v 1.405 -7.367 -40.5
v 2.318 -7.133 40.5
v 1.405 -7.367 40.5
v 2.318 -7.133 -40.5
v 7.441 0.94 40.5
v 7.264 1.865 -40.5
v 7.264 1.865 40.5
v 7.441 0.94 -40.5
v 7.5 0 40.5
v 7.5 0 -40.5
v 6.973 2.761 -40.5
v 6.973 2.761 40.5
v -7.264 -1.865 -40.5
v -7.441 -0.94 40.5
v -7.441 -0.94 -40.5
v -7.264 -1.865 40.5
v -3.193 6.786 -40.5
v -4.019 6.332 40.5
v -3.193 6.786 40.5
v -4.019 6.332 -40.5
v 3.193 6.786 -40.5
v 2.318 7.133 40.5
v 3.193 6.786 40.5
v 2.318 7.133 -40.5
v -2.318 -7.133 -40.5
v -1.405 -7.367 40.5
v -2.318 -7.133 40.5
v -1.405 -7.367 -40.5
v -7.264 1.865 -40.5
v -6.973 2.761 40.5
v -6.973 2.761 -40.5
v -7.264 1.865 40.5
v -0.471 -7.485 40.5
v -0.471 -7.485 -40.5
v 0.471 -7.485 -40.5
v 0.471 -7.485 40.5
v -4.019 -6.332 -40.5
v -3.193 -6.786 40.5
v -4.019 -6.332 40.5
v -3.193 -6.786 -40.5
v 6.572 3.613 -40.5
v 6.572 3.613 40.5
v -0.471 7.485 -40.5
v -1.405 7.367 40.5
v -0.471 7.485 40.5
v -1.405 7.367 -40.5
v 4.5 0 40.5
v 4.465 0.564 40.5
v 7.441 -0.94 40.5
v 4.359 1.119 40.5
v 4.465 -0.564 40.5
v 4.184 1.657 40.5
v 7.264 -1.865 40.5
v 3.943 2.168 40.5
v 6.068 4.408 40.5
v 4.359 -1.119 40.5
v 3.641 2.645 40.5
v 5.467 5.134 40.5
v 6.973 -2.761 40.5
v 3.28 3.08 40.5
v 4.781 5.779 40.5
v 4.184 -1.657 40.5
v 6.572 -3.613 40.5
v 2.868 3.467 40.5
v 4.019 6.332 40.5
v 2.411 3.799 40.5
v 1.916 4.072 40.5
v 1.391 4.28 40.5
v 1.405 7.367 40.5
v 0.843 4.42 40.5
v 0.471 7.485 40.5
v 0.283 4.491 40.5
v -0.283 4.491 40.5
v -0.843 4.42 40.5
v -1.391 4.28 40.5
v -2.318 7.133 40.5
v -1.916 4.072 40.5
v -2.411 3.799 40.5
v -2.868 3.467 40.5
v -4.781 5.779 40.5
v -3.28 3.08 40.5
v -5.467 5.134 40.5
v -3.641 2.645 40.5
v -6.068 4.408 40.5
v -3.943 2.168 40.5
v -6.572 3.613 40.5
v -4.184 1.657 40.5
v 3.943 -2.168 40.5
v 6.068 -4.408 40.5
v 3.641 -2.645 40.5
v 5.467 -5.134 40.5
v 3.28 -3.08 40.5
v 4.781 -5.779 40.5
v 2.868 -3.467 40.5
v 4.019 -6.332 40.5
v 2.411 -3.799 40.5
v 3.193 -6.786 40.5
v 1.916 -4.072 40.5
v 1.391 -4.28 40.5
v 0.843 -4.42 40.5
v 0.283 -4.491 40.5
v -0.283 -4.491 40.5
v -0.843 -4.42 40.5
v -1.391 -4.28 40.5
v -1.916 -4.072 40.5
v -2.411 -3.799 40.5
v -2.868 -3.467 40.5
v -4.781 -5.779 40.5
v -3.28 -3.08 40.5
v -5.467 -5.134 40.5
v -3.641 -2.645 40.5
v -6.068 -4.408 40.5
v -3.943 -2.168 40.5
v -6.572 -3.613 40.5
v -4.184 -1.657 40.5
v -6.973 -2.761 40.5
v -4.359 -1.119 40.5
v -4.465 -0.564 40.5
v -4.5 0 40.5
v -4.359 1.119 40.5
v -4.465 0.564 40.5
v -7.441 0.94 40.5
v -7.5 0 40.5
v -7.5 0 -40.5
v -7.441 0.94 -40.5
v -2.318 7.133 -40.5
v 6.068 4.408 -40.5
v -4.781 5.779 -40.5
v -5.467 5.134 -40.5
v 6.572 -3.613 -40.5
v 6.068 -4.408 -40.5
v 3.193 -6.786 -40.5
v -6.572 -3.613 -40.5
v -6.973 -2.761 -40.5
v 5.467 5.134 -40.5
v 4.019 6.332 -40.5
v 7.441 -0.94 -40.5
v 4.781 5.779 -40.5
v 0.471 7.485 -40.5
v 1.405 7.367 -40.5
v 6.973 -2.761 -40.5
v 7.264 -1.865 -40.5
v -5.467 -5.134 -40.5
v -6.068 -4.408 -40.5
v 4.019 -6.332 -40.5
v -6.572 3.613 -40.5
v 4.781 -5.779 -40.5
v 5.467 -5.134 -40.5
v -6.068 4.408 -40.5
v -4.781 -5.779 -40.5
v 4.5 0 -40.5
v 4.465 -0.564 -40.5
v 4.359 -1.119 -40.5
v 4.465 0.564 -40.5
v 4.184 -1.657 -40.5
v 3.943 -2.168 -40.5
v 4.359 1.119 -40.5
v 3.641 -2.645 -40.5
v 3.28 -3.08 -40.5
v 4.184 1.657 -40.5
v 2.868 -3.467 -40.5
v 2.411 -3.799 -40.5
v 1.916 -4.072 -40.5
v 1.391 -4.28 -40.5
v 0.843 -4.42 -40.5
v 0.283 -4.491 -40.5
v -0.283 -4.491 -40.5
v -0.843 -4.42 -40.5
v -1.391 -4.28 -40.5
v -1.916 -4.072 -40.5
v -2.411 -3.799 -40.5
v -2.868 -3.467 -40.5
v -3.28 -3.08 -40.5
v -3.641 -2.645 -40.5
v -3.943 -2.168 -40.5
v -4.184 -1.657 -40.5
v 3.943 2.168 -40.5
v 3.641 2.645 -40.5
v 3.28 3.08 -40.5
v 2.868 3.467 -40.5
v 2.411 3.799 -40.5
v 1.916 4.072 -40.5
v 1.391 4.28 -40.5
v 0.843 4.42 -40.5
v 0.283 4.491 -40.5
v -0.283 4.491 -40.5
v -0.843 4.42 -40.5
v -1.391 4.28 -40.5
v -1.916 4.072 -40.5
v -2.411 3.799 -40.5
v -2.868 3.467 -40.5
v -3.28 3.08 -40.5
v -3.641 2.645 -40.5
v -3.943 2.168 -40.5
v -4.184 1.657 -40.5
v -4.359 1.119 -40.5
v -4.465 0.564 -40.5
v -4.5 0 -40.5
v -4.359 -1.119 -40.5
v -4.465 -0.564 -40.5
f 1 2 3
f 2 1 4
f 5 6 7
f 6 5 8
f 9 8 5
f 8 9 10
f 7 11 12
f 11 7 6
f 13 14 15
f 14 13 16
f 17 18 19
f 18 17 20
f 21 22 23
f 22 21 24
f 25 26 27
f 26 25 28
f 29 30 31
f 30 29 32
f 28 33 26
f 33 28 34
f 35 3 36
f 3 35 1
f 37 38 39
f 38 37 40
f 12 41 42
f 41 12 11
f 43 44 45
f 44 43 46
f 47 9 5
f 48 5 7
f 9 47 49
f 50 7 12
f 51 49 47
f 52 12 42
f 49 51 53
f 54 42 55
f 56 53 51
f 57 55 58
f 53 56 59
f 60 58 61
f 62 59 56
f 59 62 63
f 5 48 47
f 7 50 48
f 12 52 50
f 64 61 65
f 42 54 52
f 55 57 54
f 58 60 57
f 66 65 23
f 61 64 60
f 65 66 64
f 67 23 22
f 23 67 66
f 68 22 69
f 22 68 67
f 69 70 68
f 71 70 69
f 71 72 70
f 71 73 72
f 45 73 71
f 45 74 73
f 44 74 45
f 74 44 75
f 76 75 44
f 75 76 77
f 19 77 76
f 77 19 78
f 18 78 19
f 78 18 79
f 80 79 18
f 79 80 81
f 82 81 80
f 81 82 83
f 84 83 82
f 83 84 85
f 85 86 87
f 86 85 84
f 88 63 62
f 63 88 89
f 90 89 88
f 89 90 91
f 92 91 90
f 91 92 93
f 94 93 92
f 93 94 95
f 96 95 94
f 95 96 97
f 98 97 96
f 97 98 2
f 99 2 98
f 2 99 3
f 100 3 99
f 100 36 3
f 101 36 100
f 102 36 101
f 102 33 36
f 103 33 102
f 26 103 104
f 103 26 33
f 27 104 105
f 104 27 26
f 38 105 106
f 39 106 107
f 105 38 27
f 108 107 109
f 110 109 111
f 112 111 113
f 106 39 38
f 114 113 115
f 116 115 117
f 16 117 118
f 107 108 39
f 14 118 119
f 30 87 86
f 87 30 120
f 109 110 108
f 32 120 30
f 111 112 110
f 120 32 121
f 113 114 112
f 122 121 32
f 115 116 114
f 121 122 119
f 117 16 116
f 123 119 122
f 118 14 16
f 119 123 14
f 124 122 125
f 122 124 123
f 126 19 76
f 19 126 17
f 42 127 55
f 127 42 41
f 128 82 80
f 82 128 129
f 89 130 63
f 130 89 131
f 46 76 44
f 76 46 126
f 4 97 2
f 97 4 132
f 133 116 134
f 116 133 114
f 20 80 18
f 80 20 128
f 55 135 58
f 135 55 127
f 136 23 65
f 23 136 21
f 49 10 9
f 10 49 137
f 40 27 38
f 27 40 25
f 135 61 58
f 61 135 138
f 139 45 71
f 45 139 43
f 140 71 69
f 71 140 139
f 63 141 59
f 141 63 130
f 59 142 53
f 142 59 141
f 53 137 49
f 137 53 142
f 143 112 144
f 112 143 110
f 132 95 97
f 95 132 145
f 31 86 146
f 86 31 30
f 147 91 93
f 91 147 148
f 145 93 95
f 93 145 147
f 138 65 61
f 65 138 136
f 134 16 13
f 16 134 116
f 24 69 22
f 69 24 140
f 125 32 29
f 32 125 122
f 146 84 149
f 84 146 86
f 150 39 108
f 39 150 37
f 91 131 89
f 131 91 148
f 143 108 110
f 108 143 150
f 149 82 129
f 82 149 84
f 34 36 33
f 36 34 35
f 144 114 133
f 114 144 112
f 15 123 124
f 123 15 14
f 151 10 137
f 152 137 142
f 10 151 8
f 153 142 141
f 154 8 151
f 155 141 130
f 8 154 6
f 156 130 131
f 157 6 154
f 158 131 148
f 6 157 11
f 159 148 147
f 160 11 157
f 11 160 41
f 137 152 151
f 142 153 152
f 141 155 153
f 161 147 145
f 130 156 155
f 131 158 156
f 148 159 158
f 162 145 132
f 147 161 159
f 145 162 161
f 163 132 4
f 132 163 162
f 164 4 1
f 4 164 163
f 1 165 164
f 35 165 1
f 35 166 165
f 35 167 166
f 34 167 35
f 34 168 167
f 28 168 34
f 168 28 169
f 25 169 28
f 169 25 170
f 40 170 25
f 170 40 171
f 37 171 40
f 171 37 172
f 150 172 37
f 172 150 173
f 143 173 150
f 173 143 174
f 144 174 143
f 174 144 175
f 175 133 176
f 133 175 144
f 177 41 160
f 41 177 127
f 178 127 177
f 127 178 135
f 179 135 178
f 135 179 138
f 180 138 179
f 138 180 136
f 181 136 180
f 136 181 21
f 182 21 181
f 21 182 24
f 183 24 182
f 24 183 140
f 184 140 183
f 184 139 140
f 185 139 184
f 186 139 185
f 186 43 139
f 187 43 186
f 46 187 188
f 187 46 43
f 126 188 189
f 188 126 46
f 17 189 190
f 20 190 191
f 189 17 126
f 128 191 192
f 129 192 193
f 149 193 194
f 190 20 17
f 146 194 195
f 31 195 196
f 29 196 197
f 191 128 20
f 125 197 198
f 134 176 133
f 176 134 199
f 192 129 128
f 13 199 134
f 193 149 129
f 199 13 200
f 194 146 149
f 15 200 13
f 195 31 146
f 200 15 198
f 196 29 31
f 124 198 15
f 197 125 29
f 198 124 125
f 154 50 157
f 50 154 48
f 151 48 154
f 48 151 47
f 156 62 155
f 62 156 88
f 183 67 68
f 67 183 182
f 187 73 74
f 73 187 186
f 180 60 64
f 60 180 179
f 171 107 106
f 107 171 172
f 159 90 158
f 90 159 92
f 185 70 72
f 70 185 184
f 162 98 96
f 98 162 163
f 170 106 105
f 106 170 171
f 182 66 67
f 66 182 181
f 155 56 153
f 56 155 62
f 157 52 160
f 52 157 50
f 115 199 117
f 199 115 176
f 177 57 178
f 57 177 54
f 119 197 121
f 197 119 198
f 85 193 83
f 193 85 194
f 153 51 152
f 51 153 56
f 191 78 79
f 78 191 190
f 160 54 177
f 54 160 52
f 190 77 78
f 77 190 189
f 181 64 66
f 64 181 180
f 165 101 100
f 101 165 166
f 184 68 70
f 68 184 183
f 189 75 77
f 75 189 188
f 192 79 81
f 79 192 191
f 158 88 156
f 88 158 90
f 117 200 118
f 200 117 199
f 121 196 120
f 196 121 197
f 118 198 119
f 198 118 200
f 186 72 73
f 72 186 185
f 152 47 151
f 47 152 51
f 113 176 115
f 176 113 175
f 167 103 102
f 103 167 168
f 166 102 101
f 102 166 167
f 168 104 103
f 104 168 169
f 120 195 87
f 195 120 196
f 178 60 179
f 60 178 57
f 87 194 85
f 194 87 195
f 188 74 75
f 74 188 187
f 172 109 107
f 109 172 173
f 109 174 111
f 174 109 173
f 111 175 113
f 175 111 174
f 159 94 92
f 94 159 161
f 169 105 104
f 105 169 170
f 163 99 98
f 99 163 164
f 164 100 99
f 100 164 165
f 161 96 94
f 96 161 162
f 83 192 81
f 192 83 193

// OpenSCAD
$fn = 50;


difference() {
	union() {
		translate(v = [0, 0, -40.5000000000]) {
			cylinder(h = 81, r = 7.5000000000);
		}
	}
	union() {
		translate(v = [0, 0, -100.0000000000]) {
			cylinder(h = 200, r = 4.5000000000);
		}
	}
}
